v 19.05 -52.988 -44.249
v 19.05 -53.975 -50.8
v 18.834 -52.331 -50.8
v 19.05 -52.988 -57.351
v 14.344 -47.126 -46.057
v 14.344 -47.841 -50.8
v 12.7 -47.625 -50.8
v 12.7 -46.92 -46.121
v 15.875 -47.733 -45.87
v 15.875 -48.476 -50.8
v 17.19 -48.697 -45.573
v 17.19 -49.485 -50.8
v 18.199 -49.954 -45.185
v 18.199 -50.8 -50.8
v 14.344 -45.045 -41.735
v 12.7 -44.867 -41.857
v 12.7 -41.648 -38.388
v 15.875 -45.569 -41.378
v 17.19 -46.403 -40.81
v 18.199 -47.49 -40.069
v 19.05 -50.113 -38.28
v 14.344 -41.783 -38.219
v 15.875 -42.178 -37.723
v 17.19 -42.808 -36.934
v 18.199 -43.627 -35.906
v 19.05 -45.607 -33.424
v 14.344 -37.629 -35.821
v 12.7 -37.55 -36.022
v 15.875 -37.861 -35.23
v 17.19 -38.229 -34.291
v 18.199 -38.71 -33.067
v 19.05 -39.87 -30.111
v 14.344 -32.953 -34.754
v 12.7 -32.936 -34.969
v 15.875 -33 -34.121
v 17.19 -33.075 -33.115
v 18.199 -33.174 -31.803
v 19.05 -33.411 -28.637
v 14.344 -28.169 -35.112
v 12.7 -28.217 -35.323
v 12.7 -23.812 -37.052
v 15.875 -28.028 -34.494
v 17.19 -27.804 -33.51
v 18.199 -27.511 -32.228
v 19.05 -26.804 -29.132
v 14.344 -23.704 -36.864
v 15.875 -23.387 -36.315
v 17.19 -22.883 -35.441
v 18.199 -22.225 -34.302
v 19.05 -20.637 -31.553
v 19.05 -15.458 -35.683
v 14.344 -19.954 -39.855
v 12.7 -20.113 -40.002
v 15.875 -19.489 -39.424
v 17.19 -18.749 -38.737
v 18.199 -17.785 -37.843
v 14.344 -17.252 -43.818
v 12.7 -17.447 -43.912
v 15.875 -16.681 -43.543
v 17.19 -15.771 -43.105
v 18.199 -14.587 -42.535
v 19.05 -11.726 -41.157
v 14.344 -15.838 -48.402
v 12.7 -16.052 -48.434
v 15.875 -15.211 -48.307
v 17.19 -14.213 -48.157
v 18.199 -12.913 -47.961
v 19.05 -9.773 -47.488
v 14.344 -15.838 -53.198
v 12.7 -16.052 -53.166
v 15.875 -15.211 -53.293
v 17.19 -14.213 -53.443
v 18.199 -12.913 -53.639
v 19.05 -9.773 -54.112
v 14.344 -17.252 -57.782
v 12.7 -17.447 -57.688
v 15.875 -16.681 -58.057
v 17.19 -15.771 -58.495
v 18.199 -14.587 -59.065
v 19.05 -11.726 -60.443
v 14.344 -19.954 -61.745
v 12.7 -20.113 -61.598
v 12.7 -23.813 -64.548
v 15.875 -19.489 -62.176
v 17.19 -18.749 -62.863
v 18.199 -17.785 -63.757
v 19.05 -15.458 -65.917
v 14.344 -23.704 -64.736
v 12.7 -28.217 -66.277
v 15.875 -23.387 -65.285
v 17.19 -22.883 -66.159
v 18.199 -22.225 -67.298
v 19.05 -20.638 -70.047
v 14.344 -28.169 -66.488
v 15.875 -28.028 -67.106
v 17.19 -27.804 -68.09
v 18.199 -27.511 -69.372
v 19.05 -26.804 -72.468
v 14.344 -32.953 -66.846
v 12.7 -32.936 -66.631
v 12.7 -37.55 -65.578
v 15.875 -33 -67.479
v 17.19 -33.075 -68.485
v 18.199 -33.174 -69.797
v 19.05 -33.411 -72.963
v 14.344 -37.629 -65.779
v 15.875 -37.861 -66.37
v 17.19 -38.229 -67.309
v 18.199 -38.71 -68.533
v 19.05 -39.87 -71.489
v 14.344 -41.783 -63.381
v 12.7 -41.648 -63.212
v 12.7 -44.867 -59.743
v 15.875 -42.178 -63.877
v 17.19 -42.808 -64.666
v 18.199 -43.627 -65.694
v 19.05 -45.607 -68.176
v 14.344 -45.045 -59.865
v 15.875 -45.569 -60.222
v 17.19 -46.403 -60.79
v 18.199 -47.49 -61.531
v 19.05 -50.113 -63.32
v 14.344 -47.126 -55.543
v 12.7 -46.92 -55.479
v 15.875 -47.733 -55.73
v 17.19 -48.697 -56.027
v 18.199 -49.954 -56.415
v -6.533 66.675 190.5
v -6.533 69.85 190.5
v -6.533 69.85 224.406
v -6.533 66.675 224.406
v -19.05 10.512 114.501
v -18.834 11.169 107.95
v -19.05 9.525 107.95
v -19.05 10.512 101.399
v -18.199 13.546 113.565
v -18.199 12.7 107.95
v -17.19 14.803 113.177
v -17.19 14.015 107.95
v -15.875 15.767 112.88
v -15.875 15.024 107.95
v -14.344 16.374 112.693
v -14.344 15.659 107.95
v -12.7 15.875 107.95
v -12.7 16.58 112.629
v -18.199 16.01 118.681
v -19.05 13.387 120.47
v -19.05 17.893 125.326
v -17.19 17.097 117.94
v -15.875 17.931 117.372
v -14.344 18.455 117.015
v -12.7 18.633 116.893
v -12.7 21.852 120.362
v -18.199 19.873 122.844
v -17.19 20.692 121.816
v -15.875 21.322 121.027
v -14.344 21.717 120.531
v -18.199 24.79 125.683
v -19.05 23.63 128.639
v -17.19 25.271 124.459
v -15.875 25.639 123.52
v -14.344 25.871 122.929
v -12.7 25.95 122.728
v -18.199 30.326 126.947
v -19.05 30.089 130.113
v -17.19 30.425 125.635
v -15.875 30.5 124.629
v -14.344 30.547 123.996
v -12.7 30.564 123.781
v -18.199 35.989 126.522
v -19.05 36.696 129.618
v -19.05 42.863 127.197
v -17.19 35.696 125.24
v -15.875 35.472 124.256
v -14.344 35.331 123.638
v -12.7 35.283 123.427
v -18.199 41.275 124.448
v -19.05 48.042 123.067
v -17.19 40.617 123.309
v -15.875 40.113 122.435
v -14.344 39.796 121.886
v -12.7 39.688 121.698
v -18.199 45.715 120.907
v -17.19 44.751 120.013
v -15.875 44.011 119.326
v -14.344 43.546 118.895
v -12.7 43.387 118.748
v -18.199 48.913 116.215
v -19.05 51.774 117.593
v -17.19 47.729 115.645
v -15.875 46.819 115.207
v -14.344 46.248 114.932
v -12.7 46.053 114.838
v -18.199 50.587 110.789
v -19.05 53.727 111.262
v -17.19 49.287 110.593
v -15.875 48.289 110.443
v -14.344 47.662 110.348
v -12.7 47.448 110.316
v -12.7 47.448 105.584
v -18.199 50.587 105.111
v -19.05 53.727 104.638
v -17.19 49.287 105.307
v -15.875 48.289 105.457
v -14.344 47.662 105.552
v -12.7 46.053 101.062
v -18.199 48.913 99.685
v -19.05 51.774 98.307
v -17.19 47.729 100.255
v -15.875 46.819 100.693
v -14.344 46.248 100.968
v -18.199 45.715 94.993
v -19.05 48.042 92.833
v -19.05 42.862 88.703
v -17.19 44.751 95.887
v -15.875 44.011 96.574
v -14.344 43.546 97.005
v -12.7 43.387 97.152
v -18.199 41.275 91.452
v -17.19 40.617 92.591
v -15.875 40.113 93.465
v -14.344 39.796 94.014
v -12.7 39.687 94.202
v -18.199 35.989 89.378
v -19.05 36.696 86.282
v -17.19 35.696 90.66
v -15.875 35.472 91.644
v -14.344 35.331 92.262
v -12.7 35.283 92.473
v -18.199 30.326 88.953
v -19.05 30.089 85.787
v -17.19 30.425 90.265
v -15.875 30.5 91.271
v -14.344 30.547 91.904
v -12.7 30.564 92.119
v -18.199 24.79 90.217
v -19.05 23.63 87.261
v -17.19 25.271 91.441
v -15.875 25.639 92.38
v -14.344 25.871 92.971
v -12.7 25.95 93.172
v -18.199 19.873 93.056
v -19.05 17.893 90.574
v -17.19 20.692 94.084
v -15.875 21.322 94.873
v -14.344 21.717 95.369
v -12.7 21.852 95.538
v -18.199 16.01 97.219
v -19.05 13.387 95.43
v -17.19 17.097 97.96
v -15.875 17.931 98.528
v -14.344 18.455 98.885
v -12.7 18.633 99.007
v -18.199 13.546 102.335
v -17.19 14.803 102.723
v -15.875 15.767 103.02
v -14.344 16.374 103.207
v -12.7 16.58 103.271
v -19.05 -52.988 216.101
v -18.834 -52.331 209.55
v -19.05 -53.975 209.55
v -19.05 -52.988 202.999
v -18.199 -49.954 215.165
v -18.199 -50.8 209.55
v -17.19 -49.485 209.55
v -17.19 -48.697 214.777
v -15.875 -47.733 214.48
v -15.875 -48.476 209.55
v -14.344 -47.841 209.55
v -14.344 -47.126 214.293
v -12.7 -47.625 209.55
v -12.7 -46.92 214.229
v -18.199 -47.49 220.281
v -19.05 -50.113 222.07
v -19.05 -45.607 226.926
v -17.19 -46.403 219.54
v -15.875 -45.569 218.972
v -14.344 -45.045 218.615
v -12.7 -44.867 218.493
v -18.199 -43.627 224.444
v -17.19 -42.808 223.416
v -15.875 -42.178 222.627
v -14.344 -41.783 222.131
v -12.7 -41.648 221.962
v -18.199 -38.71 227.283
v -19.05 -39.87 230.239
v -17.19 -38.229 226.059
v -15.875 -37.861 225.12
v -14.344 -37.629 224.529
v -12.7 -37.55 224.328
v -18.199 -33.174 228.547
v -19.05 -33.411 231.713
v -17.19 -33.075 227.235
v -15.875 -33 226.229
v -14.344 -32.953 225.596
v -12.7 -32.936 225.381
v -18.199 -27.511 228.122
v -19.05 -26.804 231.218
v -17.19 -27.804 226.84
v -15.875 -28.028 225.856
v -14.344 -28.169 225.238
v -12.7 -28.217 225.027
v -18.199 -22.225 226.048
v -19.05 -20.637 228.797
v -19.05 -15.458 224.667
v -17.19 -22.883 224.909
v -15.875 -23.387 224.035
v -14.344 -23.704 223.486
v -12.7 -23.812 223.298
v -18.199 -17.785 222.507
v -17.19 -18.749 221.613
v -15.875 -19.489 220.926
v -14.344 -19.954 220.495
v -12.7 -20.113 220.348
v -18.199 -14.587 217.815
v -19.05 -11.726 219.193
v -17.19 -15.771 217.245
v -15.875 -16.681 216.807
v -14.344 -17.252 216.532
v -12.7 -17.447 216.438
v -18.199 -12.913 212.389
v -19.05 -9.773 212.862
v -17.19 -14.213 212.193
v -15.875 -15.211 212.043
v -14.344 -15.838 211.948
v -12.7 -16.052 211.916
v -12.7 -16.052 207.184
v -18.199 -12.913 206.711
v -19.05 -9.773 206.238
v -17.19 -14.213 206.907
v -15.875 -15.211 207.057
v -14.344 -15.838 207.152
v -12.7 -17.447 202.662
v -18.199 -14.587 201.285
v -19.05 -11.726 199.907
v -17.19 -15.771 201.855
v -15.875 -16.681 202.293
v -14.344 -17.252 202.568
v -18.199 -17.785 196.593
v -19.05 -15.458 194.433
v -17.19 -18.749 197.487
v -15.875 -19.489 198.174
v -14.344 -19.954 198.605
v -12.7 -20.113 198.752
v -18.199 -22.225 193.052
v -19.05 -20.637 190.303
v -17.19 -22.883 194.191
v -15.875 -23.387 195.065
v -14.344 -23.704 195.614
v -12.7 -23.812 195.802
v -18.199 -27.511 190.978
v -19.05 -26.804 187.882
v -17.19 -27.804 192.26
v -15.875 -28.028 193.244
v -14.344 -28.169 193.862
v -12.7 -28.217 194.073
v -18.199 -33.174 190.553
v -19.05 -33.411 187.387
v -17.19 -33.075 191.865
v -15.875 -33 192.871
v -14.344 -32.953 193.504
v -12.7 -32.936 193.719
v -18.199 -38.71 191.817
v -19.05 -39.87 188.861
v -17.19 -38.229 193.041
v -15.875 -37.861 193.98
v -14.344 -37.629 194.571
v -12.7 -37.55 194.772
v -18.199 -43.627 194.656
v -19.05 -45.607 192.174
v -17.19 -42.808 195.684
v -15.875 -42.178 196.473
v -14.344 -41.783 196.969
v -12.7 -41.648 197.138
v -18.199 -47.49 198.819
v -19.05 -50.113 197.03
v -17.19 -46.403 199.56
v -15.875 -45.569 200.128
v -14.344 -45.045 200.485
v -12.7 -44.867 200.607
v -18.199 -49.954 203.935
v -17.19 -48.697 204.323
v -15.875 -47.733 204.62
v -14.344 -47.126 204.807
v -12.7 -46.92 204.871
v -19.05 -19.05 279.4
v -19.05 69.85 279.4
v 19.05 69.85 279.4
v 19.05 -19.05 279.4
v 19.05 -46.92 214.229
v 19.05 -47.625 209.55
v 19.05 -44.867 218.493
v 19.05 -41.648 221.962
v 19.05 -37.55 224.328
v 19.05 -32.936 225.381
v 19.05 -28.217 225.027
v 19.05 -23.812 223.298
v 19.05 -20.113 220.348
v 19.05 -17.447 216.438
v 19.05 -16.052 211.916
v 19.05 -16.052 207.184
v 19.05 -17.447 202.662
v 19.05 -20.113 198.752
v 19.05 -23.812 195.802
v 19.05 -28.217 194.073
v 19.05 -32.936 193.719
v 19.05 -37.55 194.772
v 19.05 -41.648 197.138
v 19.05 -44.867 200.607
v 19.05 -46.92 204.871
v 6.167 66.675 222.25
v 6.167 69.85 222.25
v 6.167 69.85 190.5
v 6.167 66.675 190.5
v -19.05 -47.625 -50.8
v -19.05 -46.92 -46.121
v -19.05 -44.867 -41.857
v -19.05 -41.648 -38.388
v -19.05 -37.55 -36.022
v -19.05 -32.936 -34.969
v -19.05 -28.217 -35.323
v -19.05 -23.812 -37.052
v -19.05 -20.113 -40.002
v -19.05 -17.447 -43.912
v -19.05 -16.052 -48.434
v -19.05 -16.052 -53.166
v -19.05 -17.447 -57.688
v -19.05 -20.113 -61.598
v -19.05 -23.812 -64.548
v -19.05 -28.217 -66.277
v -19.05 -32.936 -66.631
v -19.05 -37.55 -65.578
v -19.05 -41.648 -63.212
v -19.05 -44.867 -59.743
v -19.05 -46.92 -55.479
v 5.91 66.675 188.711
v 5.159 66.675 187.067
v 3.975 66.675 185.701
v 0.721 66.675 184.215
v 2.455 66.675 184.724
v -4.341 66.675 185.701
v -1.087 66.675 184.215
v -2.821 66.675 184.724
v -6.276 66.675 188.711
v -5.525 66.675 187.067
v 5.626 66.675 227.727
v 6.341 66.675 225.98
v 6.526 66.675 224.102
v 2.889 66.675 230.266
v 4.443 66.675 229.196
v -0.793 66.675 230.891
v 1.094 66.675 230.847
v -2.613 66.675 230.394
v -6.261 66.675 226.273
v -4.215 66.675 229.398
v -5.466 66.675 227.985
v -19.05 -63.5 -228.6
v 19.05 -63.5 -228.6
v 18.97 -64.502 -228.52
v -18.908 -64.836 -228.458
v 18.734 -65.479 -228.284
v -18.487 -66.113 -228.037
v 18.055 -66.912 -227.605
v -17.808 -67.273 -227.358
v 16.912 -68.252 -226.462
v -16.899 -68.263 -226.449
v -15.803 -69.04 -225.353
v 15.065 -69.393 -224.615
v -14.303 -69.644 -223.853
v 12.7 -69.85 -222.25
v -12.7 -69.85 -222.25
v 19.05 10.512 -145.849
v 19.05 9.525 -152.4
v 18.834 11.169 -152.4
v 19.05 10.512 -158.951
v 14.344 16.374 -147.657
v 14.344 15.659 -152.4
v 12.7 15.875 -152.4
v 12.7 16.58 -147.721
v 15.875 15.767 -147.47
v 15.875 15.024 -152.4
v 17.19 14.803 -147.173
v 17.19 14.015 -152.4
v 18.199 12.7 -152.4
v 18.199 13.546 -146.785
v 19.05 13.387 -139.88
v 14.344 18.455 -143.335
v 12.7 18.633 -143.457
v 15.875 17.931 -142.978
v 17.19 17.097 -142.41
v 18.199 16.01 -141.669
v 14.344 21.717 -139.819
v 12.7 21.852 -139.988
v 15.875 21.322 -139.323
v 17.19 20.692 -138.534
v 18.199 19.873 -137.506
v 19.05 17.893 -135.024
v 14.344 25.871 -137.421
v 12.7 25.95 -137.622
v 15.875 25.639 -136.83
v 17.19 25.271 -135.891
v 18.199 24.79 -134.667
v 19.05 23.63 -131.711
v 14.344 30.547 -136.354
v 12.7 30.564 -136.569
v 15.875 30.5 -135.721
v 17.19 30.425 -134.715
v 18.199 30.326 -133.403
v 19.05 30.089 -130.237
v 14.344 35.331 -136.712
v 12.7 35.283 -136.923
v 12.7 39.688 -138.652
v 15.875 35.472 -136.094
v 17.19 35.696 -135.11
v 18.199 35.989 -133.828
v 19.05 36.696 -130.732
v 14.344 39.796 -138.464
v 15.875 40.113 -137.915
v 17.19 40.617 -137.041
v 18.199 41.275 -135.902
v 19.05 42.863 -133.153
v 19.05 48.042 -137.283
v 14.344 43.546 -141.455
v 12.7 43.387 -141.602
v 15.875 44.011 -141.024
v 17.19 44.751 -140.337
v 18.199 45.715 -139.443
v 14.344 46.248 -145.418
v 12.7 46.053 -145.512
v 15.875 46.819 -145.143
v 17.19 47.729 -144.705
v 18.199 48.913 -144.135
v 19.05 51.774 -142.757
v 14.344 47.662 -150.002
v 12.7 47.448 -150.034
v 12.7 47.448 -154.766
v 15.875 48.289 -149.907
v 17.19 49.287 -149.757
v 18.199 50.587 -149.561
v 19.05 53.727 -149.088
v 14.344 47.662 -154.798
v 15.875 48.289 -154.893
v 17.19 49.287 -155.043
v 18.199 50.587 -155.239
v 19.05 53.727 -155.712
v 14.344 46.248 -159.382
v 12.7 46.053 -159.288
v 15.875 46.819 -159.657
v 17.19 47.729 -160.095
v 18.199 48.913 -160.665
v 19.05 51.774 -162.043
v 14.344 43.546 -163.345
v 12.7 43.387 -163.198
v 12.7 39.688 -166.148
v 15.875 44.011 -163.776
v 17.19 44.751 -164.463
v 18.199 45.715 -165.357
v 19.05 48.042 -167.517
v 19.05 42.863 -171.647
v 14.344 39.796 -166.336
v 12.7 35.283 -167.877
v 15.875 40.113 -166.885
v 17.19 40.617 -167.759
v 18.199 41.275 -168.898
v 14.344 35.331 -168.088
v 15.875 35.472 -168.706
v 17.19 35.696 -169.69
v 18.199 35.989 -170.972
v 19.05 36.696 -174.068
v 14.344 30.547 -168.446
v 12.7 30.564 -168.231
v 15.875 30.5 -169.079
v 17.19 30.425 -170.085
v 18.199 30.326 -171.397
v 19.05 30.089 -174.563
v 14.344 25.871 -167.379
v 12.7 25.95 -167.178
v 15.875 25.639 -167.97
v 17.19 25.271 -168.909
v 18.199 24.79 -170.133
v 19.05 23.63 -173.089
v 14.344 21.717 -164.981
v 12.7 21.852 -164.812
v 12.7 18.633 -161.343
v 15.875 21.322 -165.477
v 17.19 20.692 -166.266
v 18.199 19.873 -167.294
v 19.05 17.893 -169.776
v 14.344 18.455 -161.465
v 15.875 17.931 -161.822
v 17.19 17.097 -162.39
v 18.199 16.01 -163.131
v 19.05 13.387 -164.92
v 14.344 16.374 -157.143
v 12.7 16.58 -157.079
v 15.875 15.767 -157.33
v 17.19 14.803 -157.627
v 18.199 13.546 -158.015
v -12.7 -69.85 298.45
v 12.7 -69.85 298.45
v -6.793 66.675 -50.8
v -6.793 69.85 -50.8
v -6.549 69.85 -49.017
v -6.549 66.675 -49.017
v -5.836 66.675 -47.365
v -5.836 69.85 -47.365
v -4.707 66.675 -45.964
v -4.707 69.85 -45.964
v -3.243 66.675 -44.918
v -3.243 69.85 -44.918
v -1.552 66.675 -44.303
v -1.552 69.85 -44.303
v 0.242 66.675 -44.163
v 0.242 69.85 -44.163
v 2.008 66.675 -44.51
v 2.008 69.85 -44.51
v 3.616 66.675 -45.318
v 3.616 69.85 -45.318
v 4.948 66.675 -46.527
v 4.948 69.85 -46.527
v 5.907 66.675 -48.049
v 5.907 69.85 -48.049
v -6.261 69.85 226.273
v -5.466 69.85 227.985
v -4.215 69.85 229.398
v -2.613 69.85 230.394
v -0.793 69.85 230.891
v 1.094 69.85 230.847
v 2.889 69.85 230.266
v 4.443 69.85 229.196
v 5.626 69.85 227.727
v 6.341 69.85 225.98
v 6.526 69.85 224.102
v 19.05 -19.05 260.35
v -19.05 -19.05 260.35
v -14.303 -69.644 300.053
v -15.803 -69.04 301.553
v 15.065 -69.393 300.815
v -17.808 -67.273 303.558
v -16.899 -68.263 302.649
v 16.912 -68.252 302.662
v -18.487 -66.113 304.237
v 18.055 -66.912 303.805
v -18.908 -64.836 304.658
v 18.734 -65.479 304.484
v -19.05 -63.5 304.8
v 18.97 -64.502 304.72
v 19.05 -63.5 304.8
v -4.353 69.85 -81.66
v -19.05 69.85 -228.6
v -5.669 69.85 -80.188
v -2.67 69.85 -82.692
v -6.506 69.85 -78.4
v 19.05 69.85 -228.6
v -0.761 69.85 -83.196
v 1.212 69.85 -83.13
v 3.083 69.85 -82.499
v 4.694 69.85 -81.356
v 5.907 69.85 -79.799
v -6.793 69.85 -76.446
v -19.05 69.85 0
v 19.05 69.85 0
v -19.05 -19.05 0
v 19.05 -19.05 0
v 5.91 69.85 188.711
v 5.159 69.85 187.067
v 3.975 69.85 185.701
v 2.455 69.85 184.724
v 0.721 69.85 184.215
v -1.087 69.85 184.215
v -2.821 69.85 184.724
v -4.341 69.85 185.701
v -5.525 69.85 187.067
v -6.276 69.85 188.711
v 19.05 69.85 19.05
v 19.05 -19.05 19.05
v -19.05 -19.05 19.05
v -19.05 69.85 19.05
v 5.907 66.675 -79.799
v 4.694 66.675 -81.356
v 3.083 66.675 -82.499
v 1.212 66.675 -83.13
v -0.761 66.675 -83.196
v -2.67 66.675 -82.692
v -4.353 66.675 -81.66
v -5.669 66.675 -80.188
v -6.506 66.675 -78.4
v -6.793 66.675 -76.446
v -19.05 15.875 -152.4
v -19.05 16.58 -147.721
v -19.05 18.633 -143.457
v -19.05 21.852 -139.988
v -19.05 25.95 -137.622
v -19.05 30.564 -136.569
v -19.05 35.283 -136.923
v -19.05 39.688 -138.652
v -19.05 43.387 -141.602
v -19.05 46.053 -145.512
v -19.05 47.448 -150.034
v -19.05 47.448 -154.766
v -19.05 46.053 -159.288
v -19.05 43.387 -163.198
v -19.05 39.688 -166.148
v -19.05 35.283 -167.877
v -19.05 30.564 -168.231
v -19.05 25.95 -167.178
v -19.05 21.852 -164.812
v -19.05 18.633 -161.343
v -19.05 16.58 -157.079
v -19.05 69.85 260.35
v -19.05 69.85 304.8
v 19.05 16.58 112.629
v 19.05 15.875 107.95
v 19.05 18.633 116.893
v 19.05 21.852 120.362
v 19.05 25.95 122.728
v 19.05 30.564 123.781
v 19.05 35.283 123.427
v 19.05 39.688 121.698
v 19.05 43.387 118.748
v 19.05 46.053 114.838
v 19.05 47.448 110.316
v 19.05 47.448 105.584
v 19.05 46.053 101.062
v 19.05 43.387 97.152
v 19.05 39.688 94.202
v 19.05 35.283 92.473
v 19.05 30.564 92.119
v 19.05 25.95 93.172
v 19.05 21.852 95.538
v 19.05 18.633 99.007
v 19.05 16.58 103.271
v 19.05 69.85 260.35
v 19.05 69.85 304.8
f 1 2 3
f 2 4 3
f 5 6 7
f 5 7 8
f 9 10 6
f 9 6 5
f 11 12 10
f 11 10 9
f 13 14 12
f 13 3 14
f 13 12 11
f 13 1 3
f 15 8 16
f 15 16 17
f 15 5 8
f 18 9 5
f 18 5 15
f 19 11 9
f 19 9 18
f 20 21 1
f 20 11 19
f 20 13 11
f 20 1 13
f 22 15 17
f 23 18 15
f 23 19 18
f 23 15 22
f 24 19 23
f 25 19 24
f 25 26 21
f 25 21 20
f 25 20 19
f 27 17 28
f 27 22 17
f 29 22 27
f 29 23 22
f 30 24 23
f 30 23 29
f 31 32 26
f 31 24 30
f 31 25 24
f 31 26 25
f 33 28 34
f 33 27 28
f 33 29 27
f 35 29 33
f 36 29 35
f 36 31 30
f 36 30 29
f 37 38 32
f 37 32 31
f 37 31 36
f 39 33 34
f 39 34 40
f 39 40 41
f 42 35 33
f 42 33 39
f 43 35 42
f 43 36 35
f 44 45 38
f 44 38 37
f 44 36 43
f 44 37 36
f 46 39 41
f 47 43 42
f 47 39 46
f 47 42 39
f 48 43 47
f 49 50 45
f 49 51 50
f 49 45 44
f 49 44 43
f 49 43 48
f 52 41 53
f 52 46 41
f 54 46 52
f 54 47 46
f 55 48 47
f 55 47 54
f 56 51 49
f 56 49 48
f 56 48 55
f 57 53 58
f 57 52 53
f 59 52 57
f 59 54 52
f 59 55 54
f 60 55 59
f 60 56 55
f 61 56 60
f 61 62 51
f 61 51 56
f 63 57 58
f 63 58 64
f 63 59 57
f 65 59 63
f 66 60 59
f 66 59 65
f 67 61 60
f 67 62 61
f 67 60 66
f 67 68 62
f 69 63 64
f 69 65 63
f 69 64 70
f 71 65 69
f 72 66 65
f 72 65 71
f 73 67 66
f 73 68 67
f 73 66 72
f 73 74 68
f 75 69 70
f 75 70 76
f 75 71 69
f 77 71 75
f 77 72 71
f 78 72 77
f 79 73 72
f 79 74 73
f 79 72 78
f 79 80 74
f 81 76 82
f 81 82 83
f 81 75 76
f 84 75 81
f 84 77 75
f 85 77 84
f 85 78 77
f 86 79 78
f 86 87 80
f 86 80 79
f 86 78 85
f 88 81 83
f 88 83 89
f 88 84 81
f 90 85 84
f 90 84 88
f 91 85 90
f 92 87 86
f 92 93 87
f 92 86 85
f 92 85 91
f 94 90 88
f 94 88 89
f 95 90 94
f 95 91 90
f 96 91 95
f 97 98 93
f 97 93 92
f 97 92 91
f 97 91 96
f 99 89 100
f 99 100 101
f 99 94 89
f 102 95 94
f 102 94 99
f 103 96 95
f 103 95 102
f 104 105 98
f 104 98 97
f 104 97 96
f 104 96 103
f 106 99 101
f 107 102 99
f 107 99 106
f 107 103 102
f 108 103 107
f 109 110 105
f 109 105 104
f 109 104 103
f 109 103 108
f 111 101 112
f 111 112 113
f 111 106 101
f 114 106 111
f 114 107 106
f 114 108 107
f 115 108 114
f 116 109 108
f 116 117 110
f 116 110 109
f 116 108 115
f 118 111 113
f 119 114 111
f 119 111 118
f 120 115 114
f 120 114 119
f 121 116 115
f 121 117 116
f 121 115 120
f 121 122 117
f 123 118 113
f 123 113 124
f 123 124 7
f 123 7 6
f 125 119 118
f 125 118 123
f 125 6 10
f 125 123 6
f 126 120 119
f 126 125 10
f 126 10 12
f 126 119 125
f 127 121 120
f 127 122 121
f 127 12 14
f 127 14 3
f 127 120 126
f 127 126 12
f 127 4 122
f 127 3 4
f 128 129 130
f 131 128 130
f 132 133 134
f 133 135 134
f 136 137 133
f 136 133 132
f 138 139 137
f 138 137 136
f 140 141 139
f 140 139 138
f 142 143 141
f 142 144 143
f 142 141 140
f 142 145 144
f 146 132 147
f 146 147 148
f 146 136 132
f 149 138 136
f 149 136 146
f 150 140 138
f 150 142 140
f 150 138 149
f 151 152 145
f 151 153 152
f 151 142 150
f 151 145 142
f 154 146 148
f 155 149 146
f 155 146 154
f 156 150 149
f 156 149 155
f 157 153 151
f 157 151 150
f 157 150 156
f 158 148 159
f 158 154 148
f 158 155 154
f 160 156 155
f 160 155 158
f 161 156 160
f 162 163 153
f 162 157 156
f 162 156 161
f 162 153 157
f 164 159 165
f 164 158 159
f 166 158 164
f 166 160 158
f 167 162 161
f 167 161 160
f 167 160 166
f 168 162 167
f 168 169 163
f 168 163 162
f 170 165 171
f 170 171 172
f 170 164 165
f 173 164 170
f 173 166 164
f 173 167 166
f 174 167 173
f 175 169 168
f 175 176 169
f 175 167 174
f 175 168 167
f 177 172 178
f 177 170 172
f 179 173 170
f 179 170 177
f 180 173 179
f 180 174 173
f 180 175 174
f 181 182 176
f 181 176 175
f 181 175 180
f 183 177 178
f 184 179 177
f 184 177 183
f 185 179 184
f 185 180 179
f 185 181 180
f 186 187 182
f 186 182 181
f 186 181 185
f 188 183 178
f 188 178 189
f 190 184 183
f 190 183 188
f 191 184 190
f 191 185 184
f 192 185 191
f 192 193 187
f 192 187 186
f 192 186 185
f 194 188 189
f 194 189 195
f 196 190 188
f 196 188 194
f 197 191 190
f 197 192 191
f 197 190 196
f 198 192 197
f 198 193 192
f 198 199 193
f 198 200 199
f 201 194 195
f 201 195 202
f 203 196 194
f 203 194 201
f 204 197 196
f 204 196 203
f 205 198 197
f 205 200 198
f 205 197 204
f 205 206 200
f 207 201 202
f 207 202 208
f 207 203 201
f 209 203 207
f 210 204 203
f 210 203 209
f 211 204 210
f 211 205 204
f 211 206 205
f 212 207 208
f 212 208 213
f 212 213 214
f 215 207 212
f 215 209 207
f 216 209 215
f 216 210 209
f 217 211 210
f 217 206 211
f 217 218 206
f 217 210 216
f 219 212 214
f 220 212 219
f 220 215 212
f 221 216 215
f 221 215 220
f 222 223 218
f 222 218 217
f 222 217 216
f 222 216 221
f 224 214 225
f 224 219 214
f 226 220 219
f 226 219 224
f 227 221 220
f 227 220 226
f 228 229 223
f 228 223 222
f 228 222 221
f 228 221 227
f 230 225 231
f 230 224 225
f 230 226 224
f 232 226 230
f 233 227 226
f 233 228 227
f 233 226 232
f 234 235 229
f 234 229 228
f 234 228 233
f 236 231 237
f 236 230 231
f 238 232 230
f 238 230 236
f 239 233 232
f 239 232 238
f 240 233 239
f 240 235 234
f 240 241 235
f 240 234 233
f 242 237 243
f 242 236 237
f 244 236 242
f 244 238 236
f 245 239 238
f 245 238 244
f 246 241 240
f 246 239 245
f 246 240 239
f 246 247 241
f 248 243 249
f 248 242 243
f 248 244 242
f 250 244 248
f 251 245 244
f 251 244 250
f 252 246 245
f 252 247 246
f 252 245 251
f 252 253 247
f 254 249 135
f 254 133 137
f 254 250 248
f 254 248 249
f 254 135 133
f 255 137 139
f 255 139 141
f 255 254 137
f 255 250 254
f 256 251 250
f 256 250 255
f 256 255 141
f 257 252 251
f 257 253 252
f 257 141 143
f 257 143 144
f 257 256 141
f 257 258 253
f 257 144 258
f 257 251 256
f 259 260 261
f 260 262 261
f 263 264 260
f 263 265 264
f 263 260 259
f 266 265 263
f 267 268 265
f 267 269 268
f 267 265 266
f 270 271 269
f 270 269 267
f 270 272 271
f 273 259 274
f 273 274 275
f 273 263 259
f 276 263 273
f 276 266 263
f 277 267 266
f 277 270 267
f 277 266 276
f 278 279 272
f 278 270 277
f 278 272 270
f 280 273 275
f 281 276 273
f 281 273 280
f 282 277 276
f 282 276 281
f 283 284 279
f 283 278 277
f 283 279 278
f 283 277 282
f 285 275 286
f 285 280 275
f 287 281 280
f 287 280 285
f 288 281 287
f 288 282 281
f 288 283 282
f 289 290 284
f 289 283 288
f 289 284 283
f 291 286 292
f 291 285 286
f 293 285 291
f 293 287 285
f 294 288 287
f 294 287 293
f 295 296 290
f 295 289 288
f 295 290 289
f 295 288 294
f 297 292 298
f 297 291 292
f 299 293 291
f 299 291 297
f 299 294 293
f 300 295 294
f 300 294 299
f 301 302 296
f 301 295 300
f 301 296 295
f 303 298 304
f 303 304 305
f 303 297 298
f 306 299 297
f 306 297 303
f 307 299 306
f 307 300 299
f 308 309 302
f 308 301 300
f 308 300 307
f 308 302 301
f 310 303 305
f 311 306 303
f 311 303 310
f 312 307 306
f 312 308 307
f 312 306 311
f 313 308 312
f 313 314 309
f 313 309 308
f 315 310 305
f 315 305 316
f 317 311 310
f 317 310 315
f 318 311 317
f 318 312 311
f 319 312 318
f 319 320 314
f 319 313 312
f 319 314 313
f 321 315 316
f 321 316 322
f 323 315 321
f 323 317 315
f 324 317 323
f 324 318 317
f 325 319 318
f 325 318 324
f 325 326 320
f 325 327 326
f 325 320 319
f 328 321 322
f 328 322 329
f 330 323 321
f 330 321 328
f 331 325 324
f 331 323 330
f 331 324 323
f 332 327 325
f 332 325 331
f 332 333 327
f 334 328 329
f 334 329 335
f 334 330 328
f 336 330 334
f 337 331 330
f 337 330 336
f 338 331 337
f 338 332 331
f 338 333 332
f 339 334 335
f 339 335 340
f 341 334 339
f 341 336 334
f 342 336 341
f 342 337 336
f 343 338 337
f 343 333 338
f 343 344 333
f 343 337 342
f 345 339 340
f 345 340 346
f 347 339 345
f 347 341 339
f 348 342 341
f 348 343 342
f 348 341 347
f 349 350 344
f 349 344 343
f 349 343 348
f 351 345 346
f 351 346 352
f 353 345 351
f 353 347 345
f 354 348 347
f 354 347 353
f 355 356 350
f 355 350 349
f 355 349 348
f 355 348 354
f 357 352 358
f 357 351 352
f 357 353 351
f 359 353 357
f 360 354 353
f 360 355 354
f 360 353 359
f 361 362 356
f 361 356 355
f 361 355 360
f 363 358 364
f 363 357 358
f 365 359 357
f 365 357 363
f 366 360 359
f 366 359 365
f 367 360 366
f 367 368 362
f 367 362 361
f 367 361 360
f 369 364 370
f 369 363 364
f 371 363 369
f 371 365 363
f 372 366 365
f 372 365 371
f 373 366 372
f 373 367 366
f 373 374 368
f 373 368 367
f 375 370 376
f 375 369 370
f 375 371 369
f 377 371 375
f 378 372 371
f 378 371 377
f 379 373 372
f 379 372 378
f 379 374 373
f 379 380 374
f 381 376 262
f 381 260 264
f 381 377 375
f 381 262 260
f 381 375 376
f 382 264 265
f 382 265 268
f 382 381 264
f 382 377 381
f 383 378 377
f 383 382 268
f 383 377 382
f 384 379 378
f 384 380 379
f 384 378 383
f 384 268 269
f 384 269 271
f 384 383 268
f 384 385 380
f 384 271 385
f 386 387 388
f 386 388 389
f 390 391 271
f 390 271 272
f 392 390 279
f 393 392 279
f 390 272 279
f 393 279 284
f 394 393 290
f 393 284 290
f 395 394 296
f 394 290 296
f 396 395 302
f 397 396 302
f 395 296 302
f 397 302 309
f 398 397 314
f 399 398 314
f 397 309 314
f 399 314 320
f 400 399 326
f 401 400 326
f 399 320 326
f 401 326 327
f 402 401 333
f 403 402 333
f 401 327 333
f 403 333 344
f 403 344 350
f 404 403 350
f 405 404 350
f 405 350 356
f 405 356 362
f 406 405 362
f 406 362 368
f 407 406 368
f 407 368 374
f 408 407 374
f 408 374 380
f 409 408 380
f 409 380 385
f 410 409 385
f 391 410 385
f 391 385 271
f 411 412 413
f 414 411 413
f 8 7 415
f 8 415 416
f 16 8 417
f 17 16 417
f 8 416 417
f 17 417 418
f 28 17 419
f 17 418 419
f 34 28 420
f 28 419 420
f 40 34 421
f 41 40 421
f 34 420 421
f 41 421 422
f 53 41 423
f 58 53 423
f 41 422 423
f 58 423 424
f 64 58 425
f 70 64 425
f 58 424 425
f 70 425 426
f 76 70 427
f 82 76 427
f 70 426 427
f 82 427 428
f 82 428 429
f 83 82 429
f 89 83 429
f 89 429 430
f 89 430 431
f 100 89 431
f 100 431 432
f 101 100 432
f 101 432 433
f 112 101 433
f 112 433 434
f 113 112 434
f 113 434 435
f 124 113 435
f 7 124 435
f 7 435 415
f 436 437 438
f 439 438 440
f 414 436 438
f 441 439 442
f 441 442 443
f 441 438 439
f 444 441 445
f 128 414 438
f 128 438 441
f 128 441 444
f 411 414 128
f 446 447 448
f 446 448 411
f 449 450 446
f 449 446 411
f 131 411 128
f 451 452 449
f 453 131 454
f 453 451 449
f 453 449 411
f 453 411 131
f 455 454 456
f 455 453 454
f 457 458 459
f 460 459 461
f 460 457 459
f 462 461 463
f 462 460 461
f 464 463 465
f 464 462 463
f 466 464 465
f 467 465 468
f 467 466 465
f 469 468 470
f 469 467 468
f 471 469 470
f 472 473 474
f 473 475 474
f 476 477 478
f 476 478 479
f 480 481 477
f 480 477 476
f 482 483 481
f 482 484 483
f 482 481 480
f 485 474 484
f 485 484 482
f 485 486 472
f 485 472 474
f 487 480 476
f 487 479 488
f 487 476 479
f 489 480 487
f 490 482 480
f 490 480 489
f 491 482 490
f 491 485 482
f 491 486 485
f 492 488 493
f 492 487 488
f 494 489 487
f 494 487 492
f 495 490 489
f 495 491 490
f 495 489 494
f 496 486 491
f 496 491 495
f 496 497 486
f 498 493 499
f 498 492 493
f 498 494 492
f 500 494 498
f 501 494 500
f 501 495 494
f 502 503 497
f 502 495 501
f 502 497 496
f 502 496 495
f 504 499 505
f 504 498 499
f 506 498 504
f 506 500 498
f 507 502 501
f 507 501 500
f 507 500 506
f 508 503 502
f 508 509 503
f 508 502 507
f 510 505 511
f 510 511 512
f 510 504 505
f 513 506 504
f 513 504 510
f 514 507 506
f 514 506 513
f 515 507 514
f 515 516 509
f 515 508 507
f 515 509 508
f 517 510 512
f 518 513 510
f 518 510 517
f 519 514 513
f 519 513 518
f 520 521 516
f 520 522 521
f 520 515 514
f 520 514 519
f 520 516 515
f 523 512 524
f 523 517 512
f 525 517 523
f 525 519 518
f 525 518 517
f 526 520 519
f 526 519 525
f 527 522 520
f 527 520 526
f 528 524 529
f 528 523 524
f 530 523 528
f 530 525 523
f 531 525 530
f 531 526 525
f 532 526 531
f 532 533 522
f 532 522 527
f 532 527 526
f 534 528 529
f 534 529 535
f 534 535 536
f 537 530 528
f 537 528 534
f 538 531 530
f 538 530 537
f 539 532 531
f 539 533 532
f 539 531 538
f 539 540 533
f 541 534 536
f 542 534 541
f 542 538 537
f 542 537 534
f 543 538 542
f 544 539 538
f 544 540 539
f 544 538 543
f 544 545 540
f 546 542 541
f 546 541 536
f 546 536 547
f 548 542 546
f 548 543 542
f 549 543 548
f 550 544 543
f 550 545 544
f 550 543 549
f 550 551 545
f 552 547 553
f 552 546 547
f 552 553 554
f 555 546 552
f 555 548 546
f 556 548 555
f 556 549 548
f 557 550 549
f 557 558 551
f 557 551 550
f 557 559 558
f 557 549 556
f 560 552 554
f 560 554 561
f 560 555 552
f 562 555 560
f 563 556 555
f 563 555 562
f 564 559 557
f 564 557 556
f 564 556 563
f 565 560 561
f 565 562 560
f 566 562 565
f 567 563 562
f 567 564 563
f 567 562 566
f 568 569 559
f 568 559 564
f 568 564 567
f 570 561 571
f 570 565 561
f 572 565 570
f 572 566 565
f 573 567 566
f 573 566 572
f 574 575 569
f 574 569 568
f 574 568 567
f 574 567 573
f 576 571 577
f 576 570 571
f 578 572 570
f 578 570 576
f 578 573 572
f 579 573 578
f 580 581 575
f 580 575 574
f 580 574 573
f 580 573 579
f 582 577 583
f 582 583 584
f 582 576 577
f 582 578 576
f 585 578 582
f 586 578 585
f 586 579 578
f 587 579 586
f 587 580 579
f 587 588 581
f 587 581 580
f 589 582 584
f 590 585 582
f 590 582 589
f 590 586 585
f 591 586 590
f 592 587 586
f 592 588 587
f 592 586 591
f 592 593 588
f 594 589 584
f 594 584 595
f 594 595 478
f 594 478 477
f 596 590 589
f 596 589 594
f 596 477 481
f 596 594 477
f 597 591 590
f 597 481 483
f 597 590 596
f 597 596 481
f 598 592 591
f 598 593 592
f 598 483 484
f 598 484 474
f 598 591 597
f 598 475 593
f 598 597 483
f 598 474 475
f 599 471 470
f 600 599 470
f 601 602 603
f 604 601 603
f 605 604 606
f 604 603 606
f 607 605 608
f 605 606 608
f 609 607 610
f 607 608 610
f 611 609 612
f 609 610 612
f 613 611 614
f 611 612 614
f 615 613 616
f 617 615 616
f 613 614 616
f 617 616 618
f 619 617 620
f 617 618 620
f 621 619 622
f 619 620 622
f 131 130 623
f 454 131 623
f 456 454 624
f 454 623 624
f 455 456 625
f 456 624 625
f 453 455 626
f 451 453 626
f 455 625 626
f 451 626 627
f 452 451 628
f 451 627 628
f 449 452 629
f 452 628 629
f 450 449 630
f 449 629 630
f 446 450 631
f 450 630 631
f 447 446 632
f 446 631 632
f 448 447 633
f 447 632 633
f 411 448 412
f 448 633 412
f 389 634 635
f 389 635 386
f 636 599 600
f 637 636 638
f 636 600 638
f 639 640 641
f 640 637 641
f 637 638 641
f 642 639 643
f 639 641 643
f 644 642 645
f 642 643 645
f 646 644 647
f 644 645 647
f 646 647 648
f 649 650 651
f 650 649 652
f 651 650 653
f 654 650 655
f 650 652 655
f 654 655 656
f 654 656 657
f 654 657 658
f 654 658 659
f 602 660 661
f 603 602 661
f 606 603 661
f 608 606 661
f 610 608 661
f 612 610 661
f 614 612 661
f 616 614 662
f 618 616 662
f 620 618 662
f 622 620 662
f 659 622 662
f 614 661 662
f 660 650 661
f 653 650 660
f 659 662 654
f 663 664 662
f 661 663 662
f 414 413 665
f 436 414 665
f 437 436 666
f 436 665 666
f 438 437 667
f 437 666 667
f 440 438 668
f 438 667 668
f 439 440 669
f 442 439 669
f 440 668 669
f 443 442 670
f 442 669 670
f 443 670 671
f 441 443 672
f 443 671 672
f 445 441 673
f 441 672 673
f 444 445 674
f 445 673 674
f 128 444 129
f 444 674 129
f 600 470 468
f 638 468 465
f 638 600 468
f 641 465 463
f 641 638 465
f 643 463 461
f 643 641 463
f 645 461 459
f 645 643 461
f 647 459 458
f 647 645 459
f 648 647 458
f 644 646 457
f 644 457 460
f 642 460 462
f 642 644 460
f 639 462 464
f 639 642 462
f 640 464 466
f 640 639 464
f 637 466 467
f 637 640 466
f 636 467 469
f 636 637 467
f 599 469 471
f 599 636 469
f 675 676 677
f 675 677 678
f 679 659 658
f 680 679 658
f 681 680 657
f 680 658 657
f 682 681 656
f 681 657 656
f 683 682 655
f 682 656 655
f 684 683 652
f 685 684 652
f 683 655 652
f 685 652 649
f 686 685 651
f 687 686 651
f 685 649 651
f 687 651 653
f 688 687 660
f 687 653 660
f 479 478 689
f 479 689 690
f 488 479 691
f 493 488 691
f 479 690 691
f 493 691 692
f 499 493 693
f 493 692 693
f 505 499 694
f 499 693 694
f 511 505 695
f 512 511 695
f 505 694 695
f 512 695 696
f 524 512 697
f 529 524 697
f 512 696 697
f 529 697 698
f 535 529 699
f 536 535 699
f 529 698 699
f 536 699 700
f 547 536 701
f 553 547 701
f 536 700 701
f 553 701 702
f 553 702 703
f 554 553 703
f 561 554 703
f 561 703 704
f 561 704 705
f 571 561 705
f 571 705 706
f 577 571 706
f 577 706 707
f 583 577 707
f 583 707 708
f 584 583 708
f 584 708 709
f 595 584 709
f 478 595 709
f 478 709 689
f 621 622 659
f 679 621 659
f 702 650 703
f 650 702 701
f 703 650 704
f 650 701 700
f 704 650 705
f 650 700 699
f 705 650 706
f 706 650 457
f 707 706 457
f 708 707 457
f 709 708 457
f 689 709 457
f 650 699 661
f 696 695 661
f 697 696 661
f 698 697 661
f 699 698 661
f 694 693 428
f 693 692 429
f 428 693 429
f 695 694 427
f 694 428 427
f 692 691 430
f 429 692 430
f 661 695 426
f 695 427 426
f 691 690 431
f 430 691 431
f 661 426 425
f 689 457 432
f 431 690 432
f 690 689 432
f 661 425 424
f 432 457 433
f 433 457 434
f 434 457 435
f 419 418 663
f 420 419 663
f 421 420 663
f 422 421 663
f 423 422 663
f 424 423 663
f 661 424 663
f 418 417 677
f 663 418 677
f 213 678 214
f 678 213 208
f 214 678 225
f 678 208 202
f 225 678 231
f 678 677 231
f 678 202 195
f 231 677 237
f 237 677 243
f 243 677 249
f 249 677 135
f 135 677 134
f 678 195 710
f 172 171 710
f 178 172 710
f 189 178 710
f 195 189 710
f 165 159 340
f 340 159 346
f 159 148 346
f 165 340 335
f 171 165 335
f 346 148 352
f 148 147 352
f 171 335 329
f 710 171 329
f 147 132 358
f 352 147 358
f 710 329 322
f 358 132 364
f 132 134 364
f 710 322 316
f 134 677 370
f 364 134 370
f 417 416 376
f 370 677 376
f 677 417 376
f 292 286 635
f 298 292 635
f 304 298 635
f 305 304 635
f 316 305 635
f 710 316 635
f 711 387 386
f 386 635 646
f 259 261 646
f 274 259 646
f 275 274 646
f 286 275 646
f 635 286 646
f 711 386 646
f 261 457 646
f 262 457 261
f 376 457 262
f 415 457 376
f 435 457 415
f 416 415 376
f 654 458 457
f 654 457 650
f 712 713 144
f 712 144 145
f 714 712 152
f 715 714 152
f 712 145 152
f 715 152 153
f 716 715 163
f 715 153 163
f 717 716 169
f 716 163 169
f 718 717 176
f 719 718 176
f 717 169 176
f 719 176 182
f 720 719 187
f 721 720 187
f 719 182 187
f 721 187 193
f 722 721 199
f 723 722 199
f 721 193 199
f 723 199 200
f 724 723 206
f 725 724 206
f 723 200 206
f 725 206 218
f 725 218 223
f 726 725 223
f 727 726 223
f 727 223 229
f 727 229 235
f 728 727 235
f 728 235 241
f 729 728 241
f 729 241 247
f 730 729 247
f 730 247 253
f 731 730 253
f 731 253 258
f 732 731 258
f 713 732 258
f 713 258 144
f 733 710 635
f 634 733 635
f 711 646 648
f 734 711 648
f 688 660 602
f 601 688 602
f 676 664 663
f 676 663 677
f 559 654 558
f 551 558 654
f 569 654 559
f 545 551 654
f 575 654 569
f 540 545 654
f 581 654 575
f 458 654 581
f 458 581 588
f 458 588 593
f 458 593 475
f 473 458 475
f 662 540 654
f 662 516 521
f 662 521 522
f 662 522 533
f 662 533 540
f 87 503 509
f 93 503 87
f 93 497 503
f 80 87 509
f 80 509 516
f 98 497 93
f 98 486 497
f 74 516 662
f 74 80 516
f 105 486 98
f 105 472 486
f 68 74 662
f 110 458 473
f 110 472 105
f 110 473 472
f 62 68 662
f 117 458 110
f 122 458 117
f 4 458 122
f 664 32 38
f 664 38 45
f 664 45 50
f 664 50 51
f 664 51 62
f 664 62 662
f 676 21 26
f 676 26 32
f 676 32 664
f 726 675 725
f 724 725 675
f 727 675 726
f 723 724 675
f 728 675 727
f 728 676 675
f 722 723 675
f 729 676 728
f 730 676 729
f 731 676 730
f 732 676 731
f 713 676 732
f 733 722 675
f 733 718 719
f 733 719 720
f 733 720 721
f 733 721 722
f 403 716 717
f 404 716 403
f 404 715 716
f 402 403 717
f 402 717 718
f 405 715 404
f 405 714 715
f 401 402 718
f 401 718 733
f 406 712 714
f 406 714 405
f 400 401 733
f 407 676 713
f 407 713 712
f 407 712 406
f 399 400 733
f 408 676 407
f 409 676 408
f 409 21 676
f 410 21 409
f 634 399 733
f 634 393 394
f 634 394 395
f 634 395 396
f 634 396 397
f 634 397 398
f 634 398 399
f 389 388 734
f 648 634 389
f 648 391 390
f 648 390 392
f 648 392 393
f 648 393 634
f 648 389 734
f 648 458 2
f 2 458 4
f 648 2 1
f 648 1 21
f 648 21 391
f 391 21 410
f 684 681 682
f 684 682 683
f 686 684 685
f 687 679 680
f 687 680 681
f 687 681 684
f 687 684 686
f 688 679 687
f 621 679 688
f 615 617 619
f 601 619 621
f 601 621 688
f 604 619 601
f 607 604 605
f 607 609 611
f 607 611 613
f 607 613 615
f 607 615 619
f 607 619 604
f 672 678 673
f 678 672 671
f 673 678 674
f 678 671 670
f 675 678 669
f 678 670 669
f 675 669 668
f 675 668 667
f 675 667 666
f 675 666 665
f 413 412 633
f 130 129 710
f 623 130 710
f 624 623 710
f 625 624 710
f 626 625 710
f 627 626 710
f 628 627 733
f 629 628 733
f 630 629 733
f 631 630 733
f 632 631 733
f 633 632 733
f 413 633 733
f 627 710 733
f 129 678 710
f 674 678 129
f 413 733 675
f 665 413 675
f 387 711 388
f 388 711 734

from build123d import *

# Parameters (mm, degrees)
F0_W          = 38.1
F0_H          = 609.6
F1_DEPTH      = 69.85
F1_DEPTH_BACK = 69.85
F2_W          = 88.9
F2_H          = 19.05
F3_DEPTH      = 38.1
F5_R          = 15.875
F6_DEPTH      = 50.8
F7_W          = 88.9
F7_H          = 19.05
F7_W_2        = 139.7
F7_H_2        = 76.2
F8_DEPTH      = 38.1
F9_R          = 6.35
F11_DEPTH     = 3.175
F12_R         = 6.35


with BuildPart() as f1:
    # F0 (on Front) → F1 (new body, two sides)
    with BuildSketch(Plane.XZ) as f1_sk:
        Rectangle(F0_W, F0_H)
    extrude(amount=F1_DEPTH)
    extrude(f1_sk.sketch, amount=-F1_DEPTH_BACK)

    # F2 (on face) → F3 (cut)
    with BuildSketch(Plane(origin=(-19.05, 0, 0), x_dir=(0, -1, 0), z_dir=(-1, 0, 0))):
        with Locations((-25.4, 269.875)):
            Rectangle(F2_W, F2_H)
    extrude(amount=-F3_DEPTH, mode=Mode.SUBTRACT)

    # F5 (on face) → F6 (cut)
    with BuildSketch(Plane(origin=(-19.05, 0, 0), x_dir=(0, -1, 0), z_dir=(-1, 0, 0))):
        with Locations((31.75, 209.55)):
            Circle(F5_R)
        with Locations((-31.75, 107.95)):
            Circle(F5_R)
        with Locations((31.75, -50.8)):
            Circle(F5_R)
        with Locations((-31.75, -152.4)):
            Circle(F5_R)
    extrude(amount=-F6_DEPTH, mode=Mode.SUBTRACT)

    # F7 (on face) → F8 (cut, through all)
    with BuildSketch(Plane.YZ.offset(19.05)):
        with Locations((25.4, 9.525)):
            Rectangle(F7_W, F7_H)
        with Locations((0, -266.7)):
            Rectangle(F7_W_2, F7_H_2)
    extrude(amount=-F8_DEPTH, mode=Mode.SUBTRACT)

    # F9
    f9_edges = [f1.edges().sort_by_distance(p)[0] for p in [
        (-19.05, -15.875, 209.55),
        (-19.05, 47.625, 107.95),
        (19.05, -15.875, -50.8),
        (19.05, 47.625, -152.4),
    ]]
    fillet(f9_edges, radius=F9_R)

    # F10 (on face) → F11 (cut)
    with BuildSketch(Plane(origin=(0, 69.85, 0), x_dir=(-1, 0, 0), z_dir=(0, 1, 0))):
        with BuildLine():
            ThreePointArc((6.5330743462, 224.4064063608), (-1.0936353663, 230.8472931087), (-6.1669256538, 222.25))
            Line((-6.1669256538, 222.25), (-6.1669256538, 190.5))
            ThreePointArc((-6.1669256538, 190.5), (0.1830743462, 184.15), (6.5330743462, 190.5))
            Line((6.5330743462, 190.5), (6.5330743462, 224.4064063608))
        make_face()
        with BuildLine():
            ThreePointArc((6.7926369745, -50.8), (1.5520159153, -44.3027542125), (-5.9073630255, -48.0492162406))
            Line((-5.9073630255, -48.0492162406), (-5.9073630255, -79.7992162406))
            ThreePointArc((-5.9073630255, -79.7992162406), (1.733975859, -83.0137515295), (6.7926369745, -76.4461610438))
            Line((6.7926369745, -76.4461610438), (6.7926369745, -50.8))
        make_face()
    extrude(amount=-F11_DEPTH, mode=Mode.SUBTRACT)

    # F12
    f12_edges = [f1.edges().sort_by_distance(p)[0] for p in [
        (19.05, -69.85, 38.1),
        (-19.05, -69.85, 38.1),
        (0, -69.85, 304.8),
        (0, -69.85, -228.6),
    ]]
    fillet(f12_edges, radius=F12_R)


solid = f1.part
